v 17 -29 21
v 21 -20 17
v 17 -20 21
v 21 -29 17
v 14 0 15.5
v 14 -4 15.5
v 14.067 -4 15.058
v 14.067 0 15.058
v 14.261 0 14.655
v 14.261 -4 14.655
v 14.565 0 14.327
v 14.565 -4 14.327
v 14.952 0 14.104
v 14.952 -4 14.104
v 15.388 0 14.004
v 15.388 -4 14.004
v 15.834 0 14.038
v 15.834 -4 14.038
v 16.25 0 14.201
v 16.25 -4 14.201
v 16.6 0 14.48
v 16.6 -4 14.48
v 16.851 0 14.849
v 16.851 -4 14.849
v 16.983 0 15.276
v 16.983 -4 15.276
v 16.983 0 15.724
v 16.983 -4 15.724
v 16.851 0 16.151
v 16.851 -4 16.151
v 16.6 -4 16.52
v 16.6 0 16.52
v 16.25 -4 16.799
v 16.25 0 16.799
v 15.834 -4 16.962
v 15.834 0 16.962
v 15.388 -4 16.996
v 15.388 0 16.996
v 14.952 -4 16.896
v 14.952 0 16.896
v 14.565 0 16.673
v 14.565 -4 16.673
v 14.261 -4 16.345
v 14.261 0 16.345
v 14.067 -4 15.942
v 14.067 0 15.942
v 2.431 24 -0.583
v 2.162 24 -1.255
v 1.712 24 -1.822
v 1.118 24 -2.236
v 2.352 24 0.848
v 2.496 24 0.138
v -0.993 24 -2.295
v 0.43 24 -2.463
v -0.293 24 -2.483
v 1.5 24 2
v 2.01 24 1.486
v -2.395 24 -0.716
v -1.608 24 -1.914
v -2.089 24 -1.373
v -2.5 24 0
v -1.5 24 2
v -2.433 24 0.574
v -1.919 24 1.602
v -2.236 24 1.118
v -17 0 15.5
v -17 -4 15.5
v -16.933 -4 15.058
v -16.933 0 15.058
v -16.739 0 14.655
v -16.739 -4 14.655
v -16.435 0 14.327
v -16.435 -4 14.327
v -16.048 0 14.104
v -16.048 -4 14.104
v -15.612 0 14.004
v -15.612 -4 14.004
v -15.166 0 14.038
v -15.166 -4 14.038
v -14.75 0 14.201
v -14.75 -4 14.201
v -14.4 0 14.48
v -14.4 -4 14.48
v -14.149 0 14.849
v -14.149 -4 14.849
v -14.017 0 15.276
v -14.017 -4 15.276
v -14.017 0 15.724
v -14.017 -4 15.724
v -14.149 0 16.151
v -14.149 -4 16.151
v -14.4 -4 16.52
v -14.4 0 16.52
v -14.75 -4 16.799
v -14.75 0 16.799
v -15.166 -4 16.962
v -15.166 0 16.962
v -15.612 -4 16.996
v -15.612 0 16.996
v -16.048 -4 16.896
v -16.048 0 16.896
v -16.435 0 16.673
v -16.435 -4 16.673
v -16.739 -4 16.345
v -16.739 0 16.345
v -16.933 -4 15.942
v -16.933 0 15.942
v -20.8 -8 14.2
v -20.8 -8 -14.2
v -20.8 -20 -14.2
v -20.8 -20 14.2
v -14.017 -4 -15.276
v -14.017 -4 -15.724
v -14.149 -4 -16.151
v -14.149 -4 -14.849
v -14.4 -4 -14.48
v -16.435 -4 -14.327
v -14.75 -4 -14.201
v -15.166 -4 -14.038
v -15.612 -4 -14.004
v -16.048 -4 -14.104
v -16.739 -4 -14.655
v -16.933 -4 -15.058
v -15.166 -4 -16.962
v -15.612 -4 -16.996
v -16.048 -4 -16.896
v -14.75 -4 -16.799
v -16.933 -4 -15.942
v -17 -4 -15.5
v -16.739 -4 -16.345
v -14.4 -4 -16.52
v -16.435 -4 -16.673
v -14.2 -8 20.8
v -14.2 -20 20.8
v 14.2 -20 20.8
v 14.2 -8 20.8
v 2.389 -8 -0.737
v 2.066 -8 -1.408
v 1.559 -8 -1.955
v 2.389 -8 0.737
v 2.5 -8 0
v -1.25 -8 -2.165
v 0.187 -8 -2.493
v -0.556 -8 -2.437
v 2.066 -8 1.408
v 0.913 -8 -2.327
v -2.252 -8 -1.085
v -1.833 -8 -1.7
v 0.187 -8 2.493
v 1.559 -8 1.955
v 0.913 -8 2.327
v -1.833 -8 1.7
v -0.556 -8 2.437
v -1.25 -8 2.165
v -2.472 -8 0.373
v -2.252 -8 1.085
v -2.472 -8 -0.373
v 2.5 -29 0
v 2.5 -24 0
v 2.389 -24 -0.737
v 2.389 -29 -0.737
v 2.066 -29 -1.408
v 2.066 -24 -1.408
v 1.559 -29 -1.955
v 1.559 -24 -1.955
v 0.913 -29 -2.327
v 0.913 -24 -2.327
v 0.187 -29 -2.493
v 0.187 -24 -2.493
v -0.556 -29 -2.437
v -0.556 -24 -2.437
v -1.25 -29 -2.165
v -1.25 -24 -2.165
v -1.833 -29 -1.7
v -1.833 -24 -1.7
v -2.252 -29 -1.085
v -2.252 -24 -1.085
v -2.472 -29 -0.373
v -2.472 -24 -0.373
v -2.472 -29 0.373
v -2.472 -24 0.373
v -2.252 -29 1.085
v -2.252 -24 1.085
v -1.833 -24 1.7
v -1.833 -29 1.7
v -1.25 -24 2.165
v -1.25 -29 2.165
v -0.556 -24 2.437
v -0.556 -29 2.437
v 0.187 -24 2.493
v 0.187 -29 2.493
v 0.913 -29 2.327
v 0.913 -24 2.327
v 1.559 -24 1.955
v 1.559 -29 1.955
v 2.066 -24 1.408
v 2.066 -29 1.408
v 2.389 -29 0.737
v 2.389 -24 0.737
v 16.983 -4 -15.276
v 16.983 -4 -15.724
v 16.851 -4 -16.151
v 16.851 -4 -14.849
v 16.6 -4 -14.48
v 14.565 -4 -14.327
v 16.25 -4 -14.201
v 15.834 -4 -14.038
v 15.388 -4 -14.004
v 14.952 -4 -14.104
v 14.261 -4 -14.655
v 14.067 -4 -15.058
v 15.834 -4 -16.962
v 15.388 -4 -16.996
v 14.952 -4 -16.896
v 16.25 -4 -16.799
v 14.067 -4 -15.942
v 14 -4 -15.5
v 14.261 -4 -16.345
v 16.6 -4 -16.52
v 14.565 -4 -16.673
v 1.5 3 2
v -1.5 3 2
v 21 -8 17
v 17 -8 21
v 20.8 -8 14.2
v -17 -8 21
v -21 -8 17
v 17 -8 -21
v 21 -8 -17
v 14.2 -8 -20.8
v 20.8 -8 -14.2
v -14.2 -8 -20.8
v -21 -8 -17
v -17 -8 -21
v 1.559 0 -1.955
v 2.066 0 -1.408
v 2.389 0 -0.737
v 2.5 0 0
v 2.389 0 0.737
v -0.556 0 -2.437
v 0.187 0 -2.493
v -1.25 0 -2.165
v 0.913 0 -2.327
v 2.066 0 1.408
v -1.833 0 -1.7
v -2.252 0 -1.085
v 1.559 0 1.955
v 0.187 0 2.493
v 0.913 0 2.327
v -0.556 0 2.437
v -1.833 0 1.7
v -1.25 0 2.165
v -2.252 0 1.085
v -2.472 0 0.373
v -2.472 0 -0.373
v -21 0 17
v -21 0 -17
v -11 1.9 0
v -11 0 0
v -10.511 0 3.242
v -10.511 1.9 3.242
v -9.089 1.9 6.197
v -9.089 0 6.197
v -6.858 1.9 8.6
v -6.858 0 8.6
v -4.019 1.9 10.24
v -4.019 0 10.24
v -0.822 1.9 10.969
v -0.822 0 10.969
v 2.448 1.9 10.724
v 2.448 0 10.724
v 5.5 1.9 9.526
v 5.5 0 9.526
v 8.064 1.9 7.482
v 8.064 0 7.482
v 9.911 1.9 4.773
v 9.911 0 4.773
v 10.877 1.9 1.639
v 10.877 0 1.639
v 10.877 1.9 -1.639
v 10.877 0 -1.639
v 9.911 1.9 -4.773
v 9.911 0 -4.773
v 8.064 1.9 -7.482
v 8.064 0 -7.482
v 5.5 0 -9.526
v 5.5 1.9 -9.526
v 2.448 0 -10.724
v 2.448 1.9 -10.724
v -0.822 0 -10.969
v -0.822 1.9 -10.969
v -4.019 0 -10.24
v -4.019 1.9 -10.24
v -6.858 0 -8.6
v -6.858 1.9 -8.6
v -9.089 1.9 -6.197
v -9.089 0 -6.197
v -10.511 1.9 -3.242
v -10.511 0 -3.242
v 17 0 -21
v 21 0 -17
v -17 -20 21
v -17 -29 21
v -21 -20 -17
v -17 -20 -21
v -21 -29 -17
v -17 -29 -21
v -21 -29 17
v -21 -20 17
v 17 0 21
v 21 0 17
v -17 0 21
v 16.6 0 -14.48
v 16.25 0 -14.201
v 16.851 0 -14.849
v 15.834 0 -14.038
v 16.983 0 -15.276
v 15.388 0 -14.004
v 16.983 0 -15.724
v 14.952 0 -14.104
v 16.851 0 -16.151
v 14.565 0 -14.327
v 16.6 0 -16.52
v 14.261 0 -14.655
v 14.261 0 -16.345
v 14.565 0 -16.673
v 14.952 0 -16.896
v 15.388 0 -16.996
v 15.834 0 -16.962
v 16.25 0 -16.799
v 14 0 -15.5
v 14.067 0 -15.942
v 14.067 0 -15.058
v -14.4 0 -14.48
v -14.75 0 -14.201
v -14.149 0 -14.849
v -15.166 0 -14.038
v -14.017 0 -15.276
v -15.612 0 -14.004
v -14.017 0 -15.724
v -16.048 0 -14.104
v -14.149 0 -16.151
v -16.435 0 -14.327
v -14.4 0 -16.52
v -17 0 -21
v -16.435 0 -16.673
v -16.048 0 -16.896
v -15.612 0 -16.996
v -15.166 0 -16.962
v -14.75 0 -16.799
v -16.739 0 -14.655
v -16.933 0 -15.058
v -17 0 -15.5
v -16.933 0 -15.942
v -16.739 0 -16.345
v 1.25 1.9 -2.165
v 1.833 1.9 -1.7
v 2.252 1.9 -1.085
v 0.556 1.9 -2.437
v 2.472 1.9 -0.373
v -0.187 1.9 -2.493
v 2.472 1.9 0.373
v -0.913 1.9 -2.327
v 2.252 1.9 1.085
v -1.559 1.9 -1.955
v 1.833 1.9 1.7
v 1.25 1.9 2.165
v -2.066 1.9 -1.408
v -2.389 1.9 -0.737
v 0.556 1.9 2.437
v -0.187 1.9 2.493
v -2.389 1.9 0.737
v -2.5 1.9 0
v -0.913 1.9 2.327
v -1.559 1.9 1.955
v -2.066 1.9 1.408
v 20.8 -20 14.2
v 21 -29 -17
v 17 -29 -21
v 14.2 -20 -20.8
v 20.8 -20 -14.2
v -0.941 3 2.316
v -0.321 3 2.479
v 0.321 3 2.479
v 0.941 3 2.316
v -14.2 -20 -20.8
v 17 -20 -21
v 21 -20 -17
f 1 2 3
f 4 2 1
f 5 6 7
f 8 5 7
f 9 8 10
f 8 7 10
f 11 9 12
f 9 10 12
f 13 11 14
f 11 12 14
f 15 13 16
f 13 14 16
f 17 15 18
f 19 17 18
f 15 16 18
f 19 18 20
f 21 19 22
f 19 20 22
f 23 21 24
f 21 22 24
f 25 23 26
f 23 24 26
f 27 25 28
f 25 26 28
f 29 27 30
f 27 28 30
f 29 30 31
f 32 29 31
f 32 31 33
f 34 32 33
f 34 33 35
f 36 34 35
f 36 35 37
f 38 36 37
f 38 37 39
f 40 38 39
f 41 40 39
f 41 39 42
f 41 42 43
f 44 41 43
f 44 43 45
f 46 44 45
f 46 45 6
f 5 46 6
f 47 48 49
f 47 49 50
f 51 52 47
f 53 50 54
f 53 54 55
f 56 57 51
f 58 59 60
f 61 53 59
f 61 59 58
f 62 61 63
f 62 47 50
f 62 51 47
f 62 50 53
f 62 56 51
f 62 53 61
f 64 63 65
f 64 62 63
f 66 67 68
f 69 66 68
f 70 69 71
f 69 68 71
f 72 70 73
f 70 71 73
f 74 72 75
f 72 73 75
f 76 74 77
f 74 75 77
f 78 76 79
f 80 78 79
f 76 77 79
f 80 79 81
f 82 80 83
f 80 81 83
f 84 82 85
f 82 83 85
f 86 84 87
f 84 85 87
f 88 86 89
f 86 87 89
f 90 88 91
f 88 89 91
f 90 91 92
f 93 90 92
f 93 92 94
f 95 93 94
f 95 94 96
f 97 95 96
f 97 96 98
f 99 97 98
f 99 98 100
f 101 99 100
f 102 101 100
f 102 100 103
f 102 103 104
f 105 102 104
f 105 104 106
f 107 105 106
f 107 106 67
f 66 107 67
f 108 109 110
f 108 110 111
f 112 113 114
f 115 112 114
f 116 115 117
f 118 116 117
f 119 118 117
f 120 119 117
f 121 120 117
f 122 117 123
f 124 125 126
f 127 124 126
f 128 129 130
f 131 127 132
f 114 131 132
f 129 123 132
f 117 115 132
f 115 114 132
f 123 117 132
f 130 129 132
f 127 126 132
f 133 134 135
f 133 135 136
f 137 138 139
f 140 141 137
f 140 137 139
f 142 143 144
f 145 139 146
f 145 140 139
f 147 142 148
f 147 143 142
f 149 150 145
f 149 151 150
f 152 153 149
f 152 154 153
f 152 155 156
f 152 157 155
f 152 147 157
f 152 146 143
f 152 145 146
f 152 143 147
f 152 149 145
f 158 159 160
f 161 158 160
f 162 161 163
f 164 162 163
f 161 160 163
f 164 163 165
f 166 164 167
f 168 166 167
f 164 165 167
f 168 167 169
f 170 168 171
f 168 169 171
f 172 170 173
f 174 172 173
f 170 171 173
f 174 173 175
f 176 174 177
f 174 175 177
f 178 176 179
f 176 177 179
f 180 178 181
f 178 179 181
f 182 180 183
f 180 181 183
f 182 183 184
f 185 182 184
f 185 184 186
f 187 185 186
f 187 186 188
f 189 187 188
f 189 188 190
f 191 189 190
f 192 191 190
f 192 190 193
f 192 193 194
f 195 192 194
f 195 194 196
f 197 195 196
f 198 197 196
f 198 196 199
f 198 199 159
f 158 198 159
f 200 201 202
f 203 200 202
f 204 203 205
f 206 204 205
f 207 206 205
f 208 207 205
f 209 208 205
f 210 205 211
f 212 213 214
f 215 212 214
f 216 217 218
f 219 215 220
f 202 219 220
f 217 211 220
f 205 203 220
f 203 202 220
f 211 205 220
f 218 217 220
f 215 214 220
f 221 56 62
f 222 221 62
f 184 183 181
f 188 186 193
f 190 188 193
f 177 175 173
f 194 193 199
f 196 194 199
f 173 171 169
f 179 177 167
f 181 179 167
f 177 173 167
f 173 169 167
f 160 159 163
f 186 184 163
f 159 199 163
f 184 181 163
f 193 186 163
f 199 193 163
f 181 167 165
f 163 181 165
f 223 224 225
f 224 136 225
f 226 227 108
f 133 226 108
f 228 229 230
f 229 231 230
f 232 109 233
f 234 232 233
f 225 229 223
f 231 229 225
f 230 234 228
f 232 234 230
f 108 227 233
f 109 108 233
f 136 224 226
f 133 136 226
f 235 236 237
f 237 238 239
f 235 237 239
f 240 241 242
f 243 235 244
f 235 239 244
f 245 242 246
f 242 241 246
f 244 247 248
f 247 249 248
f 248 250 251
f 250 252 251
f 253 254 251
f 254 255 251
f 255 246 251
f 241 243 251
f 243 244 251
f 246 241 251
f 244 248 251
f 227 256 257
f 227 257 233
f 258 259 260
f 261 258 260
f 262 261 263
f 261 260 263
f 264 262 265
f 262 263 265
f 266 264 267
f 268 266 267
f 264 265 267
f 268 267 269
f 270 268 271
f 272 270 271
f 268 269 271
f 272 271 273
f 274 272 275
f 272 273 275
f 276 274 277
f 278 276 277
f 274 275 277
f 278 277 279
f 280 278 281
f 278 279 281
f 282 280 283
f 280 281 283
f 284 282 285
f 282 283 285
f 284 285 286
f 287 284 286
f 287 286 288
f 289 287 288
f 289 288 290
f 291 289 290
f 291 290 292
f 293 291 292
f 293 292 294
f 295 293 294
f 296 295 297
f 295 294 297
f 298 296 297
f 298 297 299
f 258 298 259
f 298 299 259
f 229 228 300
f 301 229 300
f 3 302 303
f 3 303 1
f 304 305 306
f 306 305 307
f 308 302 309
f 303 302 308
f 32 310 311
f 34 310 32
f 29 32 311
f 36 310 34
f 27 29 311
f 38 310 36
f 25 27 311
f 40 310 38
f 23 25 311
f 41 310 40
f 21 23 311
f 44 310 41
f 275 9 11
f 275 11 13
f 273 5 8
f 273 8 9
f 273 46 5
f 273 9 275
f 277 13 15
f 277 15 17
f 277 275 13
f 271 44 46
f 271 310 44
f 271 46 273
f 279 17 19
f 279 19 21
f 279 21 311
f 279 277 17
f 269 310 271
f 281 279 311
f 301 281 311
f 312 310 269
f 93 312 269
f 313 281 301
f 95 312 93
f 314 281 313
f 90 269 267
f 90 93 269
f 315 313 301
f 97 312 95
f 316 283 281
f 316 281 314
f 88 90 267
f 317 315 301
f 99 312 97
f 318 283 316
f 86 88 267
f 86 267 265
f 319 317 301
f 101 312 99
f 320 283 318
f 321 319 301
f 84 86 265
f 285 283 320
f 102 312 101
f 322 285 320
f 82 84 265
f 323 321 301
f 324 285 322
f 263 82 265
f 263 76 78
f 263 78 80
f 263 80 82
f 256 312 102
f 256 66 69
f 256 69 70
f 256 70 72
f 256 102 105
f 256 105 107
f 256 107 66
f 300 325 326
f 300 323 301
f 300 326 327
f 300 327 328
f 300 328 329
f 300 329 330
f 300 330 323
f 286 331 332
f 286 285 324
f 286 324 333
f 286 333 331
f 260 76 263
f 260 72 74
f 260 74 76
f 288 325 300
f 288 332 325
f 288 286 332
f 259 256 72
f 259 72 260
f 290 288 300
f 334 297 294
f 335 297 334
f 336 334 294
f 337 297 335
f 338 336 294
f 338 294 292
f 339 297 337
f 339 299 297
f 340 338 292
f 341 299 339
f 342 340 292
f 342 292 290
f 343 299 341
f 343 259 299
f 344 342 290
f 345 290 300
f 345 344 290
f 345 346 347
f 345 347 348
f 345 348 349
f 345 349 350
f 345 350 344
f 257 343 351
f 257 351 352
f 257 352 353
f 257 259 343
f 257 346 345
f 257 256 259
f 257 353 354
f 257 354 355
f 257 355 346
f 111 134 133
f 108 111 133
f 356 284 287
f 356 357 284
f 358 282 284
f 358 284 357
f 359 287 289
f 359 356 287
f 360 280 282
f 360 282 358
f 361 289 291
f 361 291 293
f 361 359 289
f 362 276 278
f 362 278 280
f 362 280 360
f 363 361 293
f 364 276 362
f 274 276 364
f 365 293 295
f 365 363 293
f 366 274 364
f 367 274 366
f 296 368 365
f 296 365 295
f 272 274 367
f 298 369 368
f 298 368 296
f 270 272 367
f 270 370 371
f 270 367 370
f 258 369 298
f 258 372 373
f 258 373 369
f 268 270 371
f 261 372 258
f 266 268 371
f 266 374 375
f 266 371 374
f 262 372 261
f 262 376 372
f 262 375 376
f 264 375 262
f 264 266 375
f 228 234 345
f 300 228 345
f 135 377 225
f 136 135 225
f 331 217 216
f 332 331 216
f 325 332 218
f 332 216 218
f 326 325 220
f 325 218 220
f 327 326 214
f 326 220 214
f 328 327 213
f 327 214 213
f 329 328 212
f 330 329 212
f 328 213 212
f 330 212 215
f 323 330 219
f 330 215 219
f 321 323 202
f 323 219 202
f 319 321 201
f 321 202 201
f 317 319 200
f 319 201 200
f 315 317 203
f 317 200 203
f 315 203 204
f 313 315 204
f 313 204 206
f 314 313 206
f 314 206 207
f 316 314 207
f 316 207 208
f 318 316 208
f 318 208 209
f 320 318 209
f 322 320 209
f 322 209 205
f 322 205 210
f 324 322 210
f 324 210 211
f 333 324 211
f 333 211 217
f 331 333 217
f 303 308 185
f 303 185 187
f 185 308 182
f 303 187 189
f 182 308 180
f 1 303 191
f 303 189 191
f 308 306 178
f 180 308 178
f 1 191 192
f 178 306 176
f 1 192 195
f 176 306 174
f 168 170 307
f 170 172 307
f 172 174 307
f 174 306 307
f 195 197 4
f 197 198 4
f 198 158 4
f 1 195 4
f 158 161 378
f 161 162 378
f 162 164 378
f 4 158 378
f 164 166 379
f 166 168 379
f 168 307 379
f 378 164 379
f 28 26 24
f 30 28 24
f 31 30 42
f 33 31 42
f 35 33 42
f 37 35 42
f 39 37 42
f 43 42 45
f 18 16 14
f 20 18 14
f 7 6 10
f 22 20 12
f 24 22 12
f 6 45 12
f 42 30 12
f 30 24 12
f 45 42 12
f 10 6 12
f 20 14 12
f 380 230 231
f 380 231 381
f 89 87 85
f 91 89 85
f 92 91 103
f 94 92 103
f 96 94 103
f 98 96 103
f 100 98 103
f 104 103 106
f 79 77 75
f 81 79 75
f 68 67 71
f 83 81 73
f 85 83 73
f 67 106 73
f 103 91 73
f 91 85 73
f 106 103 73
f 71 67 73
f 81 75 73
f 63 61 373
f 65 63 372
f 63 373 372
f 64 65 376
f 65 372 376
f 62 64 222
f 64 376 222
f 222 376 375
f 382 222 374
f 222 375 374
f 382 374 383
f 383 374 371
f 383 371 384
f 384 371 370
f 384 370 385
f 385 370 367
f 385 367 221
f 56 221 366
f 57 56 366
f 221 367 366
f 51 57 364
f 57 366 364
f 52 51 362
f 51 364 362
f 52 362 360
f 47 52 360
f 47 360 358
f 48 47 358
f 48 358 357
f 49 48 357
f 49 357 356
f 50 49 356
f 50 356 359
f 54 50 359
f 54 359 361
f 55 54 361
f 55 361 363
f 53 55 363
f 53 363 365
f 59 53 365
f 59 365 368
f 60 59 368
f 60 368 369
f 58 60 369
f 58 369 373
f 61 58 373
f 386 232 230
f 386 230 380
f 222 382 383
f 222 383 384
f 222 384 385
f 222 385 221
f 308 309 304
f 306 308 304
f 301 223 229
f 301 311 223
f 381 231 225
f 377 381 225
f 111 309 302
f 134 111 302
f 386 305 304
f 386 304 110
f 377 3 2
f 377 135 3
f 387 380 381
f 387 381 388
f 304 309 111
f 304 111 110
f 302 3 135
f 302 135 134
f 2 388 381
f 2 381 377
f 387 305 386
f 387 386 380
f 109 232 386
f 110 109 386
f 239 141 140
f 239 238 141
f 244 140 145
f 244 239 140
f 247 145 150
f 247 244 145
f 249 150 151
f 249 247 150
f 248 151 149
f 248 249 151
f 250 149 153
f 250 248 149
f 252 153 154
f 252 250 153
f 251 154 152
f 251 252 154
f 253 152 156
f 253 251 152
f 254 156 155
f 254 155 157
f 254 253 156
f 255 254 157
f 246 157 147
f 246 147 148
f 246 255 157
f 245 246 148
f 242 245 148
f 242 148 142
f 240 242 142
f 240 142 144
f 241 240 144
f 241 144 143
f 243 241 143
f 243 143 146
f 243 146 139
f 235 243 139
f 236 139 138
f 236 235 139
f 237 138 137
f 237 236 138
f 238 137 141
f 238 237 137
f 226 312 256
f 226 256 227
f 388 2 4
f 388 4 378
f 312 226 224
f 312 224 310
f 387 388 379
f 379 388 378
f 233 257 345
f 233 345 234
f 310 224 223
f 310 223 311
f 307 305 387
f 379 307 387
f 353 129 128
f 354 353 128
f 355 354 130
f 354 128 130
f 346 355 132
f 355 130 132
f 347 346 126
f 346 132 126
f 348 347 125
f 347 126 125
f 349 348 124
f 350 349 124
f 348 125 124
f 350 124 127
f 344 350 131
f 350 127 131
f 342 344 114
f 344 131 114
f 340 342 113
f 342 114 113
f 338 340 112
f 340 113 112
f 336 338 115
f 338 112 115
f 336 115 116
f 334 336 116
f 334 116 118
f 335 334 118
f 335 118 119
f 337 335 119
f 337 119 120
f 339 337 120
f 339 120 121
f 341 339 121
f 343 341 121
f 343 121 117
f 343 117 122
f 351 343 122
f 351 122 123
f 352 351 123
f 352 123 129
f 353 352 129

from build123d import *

# Parameters (mm, degrees)
SKETCH_1_W                = 8
SKETCH_1_H                = 42
EXTRUDE_1_DEPTH           = 0.2
EXTRUDE_2_DEPTH           = 41.6
SKETCH_3_W                = 42
SKETCH_3_H                = 8
EXTRUDE_3_DEPTH           = 0.2
SKETCH_4_W                = 42
SKETCH_4_H                = 42
EXTRUDE_4_DEPTH           = 9
SKETCH_5_R                = 11
EXTRUDE_5_DEPTH           = 1.9
SKETCH_6_R                = 2.5
EXTRUDE_6_DEPTH           = 22.1
CUT_EXTRUDE_1_DEPTH       = 21
SKETCH_8_W                = 2.5
SKETCH_8_H                = 8
HOLE_WIZARD_5_0_5_1_D     = 5
HOLE_WIZARD_5_0_5_1_DEPTH = 5
HOLE_WIZARD_3_0_3_1_D     = 3
HOLE_WIZARD_3_0_3_1_DEPTH = 4
CHAMFER_1_SIZE            = 6.6
CHAMFER_2_SIZE            = 4


with BuildPart() as part:
    # 스케치1 → 보스-돌출1 (new body)
    with BuildSketch(Plane(origin=(-21, 0, 0), x_dir=(0, -1, 0), z_dir=(-1, 0, 0))):
        with Locations((4, 0)):
            Rectangle(SKETCH_1_W, SKETCH_1_H)
    extrude(amount=-EXTRUDE_1_DEPTH)

    # 스케치2 → 보스-돌출2 (add)
    with BuildSketch(Plane(origin=(-20.8, 0, 0), x_dir=(0, 0, -1), z_dir=(1, 0, 0))):
        Polygon((20.8, -8), (20.8, -20), (-20.8, -20), (-20.8, -8), (-21, -8), (-21, 0), (21, 0), (21, -8), align=None)
    extrude(amount=EXTRUDE_2_DEPTH)

    # 스케치3 → 보스-돌출3 (add)
    with BuildSketch(Plane(origin=(20.8, 0, 0), x_dir=(0, 0, -1), z_dir=(1, 0, 0))):
        with Locations((0, -4)):
            Rectangle(SKETCH_3_W, SKETCH_3_H)
    extrude(amount=EXTRUDE_3_DEPTH)

    # 스케치4 → 보스-돌출4 (add)
    with BuildSketch(Plane(origin=(0, -20, 0), x_dir=(1, 0, 0), z_dir=(0, 1, 0))):
        Rectangle(SKETCH_4_W, SKETCH_4_H)
    extrude(amount=-EXTRUDE_4_DEPTH)

    # 스케치5 → 보스-돌출5 (add)
    with BuildSketch(Plane(origin=(0, 0, 0), x_dir=(-1, 0, 0), z_dir=(0, 1, 0))):
        Circle(SKETCH_5_R)
    extrude(amount=EXTRUDE_5_DEPTH)

    # 스케치6 → 보스-돌출6 (add)
    with BuildSketch(Plane(origin=(0, 1.9, 0), x_dir=(-1, 0, 0), z_dir=(0, 1, 0))):
        Circle(SKETCH_6_R)
    extrude(amount=EXTRUDE_6_DEPTH)

    # 스케치7 → 컷-돌출1 (cut)
    with BuildSketch(Plane(origin=(0, 24, 0), x_dir=(-1, 0, 0), z_dir=(0, 1, 0))):
        with BuildLine():
            Line((-1.5, 2), (1.5, 2))
            ThreePointArc((1.5, 2), (0, 2.5), (-1.5, 2))
        make_face()
    extrude(amount=-CUT_EXTRUDE_1_DEPTH, mode=Mode.SUBTRACT)

    # 스케치8 → 컷-회전1 (revolve, cut)
    with BuildSketch(Plane.XY):
        with Locations((1.25, -4)):
            Rectangle(SKETCH_8_W, SKETCH_8_H)
    revolve(axis=Axis((0, 0, 0), (0, -1, 0)), mode=Mode.SUBTRACT)

    # Ø5.0 (5) 지름 구멍1
    with Locations(Plane(origin=(0, -29, 0), x_dir=(-1, 0, 0), z_dir=(0, -1, 0))):
        with Locations((0, 0)):
            Hole(HOLE_WIZARD_5_0_5_1_D / 2, depth=HOLE_WIZARD_5_0_5_1_DEPTH)

    # Ø3.0 (3) 지름 구멍1
    with Locations(Plane(origin=(0, 0, 0), x_dir=(1, 0, 0), z_dir=(0, 1, 0))):
        with Locations((-15.5, 15.5), (15.5, -15.5), (15.5, 15.5), (-15.5, -15.5)):
            Hole(HOLE_WIZARD_3_0_3_1_D / 2, depth=HOLE_WIZARD_3_0_3_1_DEPTH)

    # 모따기1
    chamfer_1_edges = [part.edges().sort_by_distance(p)[0] for p in [
        (-20.8, -14, 20.8),
        (-20.8, -14, -20.8),
        (20.8, -14, 20.8),
        (20.8, -14, -20.8),
    ]]
    chamfer(chamfer_1_edges, length=CHAMFER_1_SIZE)

    # 모따기2
    chamfer_2_edges = [part.edges().sort_by_distance(p)[0] for p in [
        (21, -4, -21),
        (21, -4, 21),
        (-21, -24.5, 21),
        (-21, -24.5, -21),
        (21, -24.5, -21),
        (21, -24.5, 21),
        (-21, -4, 21),
        (-21, -4, -21),
    ]]
    chamfer(chamfer_2_edges, length=CHAMFER_2_SIZE)


solid = part.part
